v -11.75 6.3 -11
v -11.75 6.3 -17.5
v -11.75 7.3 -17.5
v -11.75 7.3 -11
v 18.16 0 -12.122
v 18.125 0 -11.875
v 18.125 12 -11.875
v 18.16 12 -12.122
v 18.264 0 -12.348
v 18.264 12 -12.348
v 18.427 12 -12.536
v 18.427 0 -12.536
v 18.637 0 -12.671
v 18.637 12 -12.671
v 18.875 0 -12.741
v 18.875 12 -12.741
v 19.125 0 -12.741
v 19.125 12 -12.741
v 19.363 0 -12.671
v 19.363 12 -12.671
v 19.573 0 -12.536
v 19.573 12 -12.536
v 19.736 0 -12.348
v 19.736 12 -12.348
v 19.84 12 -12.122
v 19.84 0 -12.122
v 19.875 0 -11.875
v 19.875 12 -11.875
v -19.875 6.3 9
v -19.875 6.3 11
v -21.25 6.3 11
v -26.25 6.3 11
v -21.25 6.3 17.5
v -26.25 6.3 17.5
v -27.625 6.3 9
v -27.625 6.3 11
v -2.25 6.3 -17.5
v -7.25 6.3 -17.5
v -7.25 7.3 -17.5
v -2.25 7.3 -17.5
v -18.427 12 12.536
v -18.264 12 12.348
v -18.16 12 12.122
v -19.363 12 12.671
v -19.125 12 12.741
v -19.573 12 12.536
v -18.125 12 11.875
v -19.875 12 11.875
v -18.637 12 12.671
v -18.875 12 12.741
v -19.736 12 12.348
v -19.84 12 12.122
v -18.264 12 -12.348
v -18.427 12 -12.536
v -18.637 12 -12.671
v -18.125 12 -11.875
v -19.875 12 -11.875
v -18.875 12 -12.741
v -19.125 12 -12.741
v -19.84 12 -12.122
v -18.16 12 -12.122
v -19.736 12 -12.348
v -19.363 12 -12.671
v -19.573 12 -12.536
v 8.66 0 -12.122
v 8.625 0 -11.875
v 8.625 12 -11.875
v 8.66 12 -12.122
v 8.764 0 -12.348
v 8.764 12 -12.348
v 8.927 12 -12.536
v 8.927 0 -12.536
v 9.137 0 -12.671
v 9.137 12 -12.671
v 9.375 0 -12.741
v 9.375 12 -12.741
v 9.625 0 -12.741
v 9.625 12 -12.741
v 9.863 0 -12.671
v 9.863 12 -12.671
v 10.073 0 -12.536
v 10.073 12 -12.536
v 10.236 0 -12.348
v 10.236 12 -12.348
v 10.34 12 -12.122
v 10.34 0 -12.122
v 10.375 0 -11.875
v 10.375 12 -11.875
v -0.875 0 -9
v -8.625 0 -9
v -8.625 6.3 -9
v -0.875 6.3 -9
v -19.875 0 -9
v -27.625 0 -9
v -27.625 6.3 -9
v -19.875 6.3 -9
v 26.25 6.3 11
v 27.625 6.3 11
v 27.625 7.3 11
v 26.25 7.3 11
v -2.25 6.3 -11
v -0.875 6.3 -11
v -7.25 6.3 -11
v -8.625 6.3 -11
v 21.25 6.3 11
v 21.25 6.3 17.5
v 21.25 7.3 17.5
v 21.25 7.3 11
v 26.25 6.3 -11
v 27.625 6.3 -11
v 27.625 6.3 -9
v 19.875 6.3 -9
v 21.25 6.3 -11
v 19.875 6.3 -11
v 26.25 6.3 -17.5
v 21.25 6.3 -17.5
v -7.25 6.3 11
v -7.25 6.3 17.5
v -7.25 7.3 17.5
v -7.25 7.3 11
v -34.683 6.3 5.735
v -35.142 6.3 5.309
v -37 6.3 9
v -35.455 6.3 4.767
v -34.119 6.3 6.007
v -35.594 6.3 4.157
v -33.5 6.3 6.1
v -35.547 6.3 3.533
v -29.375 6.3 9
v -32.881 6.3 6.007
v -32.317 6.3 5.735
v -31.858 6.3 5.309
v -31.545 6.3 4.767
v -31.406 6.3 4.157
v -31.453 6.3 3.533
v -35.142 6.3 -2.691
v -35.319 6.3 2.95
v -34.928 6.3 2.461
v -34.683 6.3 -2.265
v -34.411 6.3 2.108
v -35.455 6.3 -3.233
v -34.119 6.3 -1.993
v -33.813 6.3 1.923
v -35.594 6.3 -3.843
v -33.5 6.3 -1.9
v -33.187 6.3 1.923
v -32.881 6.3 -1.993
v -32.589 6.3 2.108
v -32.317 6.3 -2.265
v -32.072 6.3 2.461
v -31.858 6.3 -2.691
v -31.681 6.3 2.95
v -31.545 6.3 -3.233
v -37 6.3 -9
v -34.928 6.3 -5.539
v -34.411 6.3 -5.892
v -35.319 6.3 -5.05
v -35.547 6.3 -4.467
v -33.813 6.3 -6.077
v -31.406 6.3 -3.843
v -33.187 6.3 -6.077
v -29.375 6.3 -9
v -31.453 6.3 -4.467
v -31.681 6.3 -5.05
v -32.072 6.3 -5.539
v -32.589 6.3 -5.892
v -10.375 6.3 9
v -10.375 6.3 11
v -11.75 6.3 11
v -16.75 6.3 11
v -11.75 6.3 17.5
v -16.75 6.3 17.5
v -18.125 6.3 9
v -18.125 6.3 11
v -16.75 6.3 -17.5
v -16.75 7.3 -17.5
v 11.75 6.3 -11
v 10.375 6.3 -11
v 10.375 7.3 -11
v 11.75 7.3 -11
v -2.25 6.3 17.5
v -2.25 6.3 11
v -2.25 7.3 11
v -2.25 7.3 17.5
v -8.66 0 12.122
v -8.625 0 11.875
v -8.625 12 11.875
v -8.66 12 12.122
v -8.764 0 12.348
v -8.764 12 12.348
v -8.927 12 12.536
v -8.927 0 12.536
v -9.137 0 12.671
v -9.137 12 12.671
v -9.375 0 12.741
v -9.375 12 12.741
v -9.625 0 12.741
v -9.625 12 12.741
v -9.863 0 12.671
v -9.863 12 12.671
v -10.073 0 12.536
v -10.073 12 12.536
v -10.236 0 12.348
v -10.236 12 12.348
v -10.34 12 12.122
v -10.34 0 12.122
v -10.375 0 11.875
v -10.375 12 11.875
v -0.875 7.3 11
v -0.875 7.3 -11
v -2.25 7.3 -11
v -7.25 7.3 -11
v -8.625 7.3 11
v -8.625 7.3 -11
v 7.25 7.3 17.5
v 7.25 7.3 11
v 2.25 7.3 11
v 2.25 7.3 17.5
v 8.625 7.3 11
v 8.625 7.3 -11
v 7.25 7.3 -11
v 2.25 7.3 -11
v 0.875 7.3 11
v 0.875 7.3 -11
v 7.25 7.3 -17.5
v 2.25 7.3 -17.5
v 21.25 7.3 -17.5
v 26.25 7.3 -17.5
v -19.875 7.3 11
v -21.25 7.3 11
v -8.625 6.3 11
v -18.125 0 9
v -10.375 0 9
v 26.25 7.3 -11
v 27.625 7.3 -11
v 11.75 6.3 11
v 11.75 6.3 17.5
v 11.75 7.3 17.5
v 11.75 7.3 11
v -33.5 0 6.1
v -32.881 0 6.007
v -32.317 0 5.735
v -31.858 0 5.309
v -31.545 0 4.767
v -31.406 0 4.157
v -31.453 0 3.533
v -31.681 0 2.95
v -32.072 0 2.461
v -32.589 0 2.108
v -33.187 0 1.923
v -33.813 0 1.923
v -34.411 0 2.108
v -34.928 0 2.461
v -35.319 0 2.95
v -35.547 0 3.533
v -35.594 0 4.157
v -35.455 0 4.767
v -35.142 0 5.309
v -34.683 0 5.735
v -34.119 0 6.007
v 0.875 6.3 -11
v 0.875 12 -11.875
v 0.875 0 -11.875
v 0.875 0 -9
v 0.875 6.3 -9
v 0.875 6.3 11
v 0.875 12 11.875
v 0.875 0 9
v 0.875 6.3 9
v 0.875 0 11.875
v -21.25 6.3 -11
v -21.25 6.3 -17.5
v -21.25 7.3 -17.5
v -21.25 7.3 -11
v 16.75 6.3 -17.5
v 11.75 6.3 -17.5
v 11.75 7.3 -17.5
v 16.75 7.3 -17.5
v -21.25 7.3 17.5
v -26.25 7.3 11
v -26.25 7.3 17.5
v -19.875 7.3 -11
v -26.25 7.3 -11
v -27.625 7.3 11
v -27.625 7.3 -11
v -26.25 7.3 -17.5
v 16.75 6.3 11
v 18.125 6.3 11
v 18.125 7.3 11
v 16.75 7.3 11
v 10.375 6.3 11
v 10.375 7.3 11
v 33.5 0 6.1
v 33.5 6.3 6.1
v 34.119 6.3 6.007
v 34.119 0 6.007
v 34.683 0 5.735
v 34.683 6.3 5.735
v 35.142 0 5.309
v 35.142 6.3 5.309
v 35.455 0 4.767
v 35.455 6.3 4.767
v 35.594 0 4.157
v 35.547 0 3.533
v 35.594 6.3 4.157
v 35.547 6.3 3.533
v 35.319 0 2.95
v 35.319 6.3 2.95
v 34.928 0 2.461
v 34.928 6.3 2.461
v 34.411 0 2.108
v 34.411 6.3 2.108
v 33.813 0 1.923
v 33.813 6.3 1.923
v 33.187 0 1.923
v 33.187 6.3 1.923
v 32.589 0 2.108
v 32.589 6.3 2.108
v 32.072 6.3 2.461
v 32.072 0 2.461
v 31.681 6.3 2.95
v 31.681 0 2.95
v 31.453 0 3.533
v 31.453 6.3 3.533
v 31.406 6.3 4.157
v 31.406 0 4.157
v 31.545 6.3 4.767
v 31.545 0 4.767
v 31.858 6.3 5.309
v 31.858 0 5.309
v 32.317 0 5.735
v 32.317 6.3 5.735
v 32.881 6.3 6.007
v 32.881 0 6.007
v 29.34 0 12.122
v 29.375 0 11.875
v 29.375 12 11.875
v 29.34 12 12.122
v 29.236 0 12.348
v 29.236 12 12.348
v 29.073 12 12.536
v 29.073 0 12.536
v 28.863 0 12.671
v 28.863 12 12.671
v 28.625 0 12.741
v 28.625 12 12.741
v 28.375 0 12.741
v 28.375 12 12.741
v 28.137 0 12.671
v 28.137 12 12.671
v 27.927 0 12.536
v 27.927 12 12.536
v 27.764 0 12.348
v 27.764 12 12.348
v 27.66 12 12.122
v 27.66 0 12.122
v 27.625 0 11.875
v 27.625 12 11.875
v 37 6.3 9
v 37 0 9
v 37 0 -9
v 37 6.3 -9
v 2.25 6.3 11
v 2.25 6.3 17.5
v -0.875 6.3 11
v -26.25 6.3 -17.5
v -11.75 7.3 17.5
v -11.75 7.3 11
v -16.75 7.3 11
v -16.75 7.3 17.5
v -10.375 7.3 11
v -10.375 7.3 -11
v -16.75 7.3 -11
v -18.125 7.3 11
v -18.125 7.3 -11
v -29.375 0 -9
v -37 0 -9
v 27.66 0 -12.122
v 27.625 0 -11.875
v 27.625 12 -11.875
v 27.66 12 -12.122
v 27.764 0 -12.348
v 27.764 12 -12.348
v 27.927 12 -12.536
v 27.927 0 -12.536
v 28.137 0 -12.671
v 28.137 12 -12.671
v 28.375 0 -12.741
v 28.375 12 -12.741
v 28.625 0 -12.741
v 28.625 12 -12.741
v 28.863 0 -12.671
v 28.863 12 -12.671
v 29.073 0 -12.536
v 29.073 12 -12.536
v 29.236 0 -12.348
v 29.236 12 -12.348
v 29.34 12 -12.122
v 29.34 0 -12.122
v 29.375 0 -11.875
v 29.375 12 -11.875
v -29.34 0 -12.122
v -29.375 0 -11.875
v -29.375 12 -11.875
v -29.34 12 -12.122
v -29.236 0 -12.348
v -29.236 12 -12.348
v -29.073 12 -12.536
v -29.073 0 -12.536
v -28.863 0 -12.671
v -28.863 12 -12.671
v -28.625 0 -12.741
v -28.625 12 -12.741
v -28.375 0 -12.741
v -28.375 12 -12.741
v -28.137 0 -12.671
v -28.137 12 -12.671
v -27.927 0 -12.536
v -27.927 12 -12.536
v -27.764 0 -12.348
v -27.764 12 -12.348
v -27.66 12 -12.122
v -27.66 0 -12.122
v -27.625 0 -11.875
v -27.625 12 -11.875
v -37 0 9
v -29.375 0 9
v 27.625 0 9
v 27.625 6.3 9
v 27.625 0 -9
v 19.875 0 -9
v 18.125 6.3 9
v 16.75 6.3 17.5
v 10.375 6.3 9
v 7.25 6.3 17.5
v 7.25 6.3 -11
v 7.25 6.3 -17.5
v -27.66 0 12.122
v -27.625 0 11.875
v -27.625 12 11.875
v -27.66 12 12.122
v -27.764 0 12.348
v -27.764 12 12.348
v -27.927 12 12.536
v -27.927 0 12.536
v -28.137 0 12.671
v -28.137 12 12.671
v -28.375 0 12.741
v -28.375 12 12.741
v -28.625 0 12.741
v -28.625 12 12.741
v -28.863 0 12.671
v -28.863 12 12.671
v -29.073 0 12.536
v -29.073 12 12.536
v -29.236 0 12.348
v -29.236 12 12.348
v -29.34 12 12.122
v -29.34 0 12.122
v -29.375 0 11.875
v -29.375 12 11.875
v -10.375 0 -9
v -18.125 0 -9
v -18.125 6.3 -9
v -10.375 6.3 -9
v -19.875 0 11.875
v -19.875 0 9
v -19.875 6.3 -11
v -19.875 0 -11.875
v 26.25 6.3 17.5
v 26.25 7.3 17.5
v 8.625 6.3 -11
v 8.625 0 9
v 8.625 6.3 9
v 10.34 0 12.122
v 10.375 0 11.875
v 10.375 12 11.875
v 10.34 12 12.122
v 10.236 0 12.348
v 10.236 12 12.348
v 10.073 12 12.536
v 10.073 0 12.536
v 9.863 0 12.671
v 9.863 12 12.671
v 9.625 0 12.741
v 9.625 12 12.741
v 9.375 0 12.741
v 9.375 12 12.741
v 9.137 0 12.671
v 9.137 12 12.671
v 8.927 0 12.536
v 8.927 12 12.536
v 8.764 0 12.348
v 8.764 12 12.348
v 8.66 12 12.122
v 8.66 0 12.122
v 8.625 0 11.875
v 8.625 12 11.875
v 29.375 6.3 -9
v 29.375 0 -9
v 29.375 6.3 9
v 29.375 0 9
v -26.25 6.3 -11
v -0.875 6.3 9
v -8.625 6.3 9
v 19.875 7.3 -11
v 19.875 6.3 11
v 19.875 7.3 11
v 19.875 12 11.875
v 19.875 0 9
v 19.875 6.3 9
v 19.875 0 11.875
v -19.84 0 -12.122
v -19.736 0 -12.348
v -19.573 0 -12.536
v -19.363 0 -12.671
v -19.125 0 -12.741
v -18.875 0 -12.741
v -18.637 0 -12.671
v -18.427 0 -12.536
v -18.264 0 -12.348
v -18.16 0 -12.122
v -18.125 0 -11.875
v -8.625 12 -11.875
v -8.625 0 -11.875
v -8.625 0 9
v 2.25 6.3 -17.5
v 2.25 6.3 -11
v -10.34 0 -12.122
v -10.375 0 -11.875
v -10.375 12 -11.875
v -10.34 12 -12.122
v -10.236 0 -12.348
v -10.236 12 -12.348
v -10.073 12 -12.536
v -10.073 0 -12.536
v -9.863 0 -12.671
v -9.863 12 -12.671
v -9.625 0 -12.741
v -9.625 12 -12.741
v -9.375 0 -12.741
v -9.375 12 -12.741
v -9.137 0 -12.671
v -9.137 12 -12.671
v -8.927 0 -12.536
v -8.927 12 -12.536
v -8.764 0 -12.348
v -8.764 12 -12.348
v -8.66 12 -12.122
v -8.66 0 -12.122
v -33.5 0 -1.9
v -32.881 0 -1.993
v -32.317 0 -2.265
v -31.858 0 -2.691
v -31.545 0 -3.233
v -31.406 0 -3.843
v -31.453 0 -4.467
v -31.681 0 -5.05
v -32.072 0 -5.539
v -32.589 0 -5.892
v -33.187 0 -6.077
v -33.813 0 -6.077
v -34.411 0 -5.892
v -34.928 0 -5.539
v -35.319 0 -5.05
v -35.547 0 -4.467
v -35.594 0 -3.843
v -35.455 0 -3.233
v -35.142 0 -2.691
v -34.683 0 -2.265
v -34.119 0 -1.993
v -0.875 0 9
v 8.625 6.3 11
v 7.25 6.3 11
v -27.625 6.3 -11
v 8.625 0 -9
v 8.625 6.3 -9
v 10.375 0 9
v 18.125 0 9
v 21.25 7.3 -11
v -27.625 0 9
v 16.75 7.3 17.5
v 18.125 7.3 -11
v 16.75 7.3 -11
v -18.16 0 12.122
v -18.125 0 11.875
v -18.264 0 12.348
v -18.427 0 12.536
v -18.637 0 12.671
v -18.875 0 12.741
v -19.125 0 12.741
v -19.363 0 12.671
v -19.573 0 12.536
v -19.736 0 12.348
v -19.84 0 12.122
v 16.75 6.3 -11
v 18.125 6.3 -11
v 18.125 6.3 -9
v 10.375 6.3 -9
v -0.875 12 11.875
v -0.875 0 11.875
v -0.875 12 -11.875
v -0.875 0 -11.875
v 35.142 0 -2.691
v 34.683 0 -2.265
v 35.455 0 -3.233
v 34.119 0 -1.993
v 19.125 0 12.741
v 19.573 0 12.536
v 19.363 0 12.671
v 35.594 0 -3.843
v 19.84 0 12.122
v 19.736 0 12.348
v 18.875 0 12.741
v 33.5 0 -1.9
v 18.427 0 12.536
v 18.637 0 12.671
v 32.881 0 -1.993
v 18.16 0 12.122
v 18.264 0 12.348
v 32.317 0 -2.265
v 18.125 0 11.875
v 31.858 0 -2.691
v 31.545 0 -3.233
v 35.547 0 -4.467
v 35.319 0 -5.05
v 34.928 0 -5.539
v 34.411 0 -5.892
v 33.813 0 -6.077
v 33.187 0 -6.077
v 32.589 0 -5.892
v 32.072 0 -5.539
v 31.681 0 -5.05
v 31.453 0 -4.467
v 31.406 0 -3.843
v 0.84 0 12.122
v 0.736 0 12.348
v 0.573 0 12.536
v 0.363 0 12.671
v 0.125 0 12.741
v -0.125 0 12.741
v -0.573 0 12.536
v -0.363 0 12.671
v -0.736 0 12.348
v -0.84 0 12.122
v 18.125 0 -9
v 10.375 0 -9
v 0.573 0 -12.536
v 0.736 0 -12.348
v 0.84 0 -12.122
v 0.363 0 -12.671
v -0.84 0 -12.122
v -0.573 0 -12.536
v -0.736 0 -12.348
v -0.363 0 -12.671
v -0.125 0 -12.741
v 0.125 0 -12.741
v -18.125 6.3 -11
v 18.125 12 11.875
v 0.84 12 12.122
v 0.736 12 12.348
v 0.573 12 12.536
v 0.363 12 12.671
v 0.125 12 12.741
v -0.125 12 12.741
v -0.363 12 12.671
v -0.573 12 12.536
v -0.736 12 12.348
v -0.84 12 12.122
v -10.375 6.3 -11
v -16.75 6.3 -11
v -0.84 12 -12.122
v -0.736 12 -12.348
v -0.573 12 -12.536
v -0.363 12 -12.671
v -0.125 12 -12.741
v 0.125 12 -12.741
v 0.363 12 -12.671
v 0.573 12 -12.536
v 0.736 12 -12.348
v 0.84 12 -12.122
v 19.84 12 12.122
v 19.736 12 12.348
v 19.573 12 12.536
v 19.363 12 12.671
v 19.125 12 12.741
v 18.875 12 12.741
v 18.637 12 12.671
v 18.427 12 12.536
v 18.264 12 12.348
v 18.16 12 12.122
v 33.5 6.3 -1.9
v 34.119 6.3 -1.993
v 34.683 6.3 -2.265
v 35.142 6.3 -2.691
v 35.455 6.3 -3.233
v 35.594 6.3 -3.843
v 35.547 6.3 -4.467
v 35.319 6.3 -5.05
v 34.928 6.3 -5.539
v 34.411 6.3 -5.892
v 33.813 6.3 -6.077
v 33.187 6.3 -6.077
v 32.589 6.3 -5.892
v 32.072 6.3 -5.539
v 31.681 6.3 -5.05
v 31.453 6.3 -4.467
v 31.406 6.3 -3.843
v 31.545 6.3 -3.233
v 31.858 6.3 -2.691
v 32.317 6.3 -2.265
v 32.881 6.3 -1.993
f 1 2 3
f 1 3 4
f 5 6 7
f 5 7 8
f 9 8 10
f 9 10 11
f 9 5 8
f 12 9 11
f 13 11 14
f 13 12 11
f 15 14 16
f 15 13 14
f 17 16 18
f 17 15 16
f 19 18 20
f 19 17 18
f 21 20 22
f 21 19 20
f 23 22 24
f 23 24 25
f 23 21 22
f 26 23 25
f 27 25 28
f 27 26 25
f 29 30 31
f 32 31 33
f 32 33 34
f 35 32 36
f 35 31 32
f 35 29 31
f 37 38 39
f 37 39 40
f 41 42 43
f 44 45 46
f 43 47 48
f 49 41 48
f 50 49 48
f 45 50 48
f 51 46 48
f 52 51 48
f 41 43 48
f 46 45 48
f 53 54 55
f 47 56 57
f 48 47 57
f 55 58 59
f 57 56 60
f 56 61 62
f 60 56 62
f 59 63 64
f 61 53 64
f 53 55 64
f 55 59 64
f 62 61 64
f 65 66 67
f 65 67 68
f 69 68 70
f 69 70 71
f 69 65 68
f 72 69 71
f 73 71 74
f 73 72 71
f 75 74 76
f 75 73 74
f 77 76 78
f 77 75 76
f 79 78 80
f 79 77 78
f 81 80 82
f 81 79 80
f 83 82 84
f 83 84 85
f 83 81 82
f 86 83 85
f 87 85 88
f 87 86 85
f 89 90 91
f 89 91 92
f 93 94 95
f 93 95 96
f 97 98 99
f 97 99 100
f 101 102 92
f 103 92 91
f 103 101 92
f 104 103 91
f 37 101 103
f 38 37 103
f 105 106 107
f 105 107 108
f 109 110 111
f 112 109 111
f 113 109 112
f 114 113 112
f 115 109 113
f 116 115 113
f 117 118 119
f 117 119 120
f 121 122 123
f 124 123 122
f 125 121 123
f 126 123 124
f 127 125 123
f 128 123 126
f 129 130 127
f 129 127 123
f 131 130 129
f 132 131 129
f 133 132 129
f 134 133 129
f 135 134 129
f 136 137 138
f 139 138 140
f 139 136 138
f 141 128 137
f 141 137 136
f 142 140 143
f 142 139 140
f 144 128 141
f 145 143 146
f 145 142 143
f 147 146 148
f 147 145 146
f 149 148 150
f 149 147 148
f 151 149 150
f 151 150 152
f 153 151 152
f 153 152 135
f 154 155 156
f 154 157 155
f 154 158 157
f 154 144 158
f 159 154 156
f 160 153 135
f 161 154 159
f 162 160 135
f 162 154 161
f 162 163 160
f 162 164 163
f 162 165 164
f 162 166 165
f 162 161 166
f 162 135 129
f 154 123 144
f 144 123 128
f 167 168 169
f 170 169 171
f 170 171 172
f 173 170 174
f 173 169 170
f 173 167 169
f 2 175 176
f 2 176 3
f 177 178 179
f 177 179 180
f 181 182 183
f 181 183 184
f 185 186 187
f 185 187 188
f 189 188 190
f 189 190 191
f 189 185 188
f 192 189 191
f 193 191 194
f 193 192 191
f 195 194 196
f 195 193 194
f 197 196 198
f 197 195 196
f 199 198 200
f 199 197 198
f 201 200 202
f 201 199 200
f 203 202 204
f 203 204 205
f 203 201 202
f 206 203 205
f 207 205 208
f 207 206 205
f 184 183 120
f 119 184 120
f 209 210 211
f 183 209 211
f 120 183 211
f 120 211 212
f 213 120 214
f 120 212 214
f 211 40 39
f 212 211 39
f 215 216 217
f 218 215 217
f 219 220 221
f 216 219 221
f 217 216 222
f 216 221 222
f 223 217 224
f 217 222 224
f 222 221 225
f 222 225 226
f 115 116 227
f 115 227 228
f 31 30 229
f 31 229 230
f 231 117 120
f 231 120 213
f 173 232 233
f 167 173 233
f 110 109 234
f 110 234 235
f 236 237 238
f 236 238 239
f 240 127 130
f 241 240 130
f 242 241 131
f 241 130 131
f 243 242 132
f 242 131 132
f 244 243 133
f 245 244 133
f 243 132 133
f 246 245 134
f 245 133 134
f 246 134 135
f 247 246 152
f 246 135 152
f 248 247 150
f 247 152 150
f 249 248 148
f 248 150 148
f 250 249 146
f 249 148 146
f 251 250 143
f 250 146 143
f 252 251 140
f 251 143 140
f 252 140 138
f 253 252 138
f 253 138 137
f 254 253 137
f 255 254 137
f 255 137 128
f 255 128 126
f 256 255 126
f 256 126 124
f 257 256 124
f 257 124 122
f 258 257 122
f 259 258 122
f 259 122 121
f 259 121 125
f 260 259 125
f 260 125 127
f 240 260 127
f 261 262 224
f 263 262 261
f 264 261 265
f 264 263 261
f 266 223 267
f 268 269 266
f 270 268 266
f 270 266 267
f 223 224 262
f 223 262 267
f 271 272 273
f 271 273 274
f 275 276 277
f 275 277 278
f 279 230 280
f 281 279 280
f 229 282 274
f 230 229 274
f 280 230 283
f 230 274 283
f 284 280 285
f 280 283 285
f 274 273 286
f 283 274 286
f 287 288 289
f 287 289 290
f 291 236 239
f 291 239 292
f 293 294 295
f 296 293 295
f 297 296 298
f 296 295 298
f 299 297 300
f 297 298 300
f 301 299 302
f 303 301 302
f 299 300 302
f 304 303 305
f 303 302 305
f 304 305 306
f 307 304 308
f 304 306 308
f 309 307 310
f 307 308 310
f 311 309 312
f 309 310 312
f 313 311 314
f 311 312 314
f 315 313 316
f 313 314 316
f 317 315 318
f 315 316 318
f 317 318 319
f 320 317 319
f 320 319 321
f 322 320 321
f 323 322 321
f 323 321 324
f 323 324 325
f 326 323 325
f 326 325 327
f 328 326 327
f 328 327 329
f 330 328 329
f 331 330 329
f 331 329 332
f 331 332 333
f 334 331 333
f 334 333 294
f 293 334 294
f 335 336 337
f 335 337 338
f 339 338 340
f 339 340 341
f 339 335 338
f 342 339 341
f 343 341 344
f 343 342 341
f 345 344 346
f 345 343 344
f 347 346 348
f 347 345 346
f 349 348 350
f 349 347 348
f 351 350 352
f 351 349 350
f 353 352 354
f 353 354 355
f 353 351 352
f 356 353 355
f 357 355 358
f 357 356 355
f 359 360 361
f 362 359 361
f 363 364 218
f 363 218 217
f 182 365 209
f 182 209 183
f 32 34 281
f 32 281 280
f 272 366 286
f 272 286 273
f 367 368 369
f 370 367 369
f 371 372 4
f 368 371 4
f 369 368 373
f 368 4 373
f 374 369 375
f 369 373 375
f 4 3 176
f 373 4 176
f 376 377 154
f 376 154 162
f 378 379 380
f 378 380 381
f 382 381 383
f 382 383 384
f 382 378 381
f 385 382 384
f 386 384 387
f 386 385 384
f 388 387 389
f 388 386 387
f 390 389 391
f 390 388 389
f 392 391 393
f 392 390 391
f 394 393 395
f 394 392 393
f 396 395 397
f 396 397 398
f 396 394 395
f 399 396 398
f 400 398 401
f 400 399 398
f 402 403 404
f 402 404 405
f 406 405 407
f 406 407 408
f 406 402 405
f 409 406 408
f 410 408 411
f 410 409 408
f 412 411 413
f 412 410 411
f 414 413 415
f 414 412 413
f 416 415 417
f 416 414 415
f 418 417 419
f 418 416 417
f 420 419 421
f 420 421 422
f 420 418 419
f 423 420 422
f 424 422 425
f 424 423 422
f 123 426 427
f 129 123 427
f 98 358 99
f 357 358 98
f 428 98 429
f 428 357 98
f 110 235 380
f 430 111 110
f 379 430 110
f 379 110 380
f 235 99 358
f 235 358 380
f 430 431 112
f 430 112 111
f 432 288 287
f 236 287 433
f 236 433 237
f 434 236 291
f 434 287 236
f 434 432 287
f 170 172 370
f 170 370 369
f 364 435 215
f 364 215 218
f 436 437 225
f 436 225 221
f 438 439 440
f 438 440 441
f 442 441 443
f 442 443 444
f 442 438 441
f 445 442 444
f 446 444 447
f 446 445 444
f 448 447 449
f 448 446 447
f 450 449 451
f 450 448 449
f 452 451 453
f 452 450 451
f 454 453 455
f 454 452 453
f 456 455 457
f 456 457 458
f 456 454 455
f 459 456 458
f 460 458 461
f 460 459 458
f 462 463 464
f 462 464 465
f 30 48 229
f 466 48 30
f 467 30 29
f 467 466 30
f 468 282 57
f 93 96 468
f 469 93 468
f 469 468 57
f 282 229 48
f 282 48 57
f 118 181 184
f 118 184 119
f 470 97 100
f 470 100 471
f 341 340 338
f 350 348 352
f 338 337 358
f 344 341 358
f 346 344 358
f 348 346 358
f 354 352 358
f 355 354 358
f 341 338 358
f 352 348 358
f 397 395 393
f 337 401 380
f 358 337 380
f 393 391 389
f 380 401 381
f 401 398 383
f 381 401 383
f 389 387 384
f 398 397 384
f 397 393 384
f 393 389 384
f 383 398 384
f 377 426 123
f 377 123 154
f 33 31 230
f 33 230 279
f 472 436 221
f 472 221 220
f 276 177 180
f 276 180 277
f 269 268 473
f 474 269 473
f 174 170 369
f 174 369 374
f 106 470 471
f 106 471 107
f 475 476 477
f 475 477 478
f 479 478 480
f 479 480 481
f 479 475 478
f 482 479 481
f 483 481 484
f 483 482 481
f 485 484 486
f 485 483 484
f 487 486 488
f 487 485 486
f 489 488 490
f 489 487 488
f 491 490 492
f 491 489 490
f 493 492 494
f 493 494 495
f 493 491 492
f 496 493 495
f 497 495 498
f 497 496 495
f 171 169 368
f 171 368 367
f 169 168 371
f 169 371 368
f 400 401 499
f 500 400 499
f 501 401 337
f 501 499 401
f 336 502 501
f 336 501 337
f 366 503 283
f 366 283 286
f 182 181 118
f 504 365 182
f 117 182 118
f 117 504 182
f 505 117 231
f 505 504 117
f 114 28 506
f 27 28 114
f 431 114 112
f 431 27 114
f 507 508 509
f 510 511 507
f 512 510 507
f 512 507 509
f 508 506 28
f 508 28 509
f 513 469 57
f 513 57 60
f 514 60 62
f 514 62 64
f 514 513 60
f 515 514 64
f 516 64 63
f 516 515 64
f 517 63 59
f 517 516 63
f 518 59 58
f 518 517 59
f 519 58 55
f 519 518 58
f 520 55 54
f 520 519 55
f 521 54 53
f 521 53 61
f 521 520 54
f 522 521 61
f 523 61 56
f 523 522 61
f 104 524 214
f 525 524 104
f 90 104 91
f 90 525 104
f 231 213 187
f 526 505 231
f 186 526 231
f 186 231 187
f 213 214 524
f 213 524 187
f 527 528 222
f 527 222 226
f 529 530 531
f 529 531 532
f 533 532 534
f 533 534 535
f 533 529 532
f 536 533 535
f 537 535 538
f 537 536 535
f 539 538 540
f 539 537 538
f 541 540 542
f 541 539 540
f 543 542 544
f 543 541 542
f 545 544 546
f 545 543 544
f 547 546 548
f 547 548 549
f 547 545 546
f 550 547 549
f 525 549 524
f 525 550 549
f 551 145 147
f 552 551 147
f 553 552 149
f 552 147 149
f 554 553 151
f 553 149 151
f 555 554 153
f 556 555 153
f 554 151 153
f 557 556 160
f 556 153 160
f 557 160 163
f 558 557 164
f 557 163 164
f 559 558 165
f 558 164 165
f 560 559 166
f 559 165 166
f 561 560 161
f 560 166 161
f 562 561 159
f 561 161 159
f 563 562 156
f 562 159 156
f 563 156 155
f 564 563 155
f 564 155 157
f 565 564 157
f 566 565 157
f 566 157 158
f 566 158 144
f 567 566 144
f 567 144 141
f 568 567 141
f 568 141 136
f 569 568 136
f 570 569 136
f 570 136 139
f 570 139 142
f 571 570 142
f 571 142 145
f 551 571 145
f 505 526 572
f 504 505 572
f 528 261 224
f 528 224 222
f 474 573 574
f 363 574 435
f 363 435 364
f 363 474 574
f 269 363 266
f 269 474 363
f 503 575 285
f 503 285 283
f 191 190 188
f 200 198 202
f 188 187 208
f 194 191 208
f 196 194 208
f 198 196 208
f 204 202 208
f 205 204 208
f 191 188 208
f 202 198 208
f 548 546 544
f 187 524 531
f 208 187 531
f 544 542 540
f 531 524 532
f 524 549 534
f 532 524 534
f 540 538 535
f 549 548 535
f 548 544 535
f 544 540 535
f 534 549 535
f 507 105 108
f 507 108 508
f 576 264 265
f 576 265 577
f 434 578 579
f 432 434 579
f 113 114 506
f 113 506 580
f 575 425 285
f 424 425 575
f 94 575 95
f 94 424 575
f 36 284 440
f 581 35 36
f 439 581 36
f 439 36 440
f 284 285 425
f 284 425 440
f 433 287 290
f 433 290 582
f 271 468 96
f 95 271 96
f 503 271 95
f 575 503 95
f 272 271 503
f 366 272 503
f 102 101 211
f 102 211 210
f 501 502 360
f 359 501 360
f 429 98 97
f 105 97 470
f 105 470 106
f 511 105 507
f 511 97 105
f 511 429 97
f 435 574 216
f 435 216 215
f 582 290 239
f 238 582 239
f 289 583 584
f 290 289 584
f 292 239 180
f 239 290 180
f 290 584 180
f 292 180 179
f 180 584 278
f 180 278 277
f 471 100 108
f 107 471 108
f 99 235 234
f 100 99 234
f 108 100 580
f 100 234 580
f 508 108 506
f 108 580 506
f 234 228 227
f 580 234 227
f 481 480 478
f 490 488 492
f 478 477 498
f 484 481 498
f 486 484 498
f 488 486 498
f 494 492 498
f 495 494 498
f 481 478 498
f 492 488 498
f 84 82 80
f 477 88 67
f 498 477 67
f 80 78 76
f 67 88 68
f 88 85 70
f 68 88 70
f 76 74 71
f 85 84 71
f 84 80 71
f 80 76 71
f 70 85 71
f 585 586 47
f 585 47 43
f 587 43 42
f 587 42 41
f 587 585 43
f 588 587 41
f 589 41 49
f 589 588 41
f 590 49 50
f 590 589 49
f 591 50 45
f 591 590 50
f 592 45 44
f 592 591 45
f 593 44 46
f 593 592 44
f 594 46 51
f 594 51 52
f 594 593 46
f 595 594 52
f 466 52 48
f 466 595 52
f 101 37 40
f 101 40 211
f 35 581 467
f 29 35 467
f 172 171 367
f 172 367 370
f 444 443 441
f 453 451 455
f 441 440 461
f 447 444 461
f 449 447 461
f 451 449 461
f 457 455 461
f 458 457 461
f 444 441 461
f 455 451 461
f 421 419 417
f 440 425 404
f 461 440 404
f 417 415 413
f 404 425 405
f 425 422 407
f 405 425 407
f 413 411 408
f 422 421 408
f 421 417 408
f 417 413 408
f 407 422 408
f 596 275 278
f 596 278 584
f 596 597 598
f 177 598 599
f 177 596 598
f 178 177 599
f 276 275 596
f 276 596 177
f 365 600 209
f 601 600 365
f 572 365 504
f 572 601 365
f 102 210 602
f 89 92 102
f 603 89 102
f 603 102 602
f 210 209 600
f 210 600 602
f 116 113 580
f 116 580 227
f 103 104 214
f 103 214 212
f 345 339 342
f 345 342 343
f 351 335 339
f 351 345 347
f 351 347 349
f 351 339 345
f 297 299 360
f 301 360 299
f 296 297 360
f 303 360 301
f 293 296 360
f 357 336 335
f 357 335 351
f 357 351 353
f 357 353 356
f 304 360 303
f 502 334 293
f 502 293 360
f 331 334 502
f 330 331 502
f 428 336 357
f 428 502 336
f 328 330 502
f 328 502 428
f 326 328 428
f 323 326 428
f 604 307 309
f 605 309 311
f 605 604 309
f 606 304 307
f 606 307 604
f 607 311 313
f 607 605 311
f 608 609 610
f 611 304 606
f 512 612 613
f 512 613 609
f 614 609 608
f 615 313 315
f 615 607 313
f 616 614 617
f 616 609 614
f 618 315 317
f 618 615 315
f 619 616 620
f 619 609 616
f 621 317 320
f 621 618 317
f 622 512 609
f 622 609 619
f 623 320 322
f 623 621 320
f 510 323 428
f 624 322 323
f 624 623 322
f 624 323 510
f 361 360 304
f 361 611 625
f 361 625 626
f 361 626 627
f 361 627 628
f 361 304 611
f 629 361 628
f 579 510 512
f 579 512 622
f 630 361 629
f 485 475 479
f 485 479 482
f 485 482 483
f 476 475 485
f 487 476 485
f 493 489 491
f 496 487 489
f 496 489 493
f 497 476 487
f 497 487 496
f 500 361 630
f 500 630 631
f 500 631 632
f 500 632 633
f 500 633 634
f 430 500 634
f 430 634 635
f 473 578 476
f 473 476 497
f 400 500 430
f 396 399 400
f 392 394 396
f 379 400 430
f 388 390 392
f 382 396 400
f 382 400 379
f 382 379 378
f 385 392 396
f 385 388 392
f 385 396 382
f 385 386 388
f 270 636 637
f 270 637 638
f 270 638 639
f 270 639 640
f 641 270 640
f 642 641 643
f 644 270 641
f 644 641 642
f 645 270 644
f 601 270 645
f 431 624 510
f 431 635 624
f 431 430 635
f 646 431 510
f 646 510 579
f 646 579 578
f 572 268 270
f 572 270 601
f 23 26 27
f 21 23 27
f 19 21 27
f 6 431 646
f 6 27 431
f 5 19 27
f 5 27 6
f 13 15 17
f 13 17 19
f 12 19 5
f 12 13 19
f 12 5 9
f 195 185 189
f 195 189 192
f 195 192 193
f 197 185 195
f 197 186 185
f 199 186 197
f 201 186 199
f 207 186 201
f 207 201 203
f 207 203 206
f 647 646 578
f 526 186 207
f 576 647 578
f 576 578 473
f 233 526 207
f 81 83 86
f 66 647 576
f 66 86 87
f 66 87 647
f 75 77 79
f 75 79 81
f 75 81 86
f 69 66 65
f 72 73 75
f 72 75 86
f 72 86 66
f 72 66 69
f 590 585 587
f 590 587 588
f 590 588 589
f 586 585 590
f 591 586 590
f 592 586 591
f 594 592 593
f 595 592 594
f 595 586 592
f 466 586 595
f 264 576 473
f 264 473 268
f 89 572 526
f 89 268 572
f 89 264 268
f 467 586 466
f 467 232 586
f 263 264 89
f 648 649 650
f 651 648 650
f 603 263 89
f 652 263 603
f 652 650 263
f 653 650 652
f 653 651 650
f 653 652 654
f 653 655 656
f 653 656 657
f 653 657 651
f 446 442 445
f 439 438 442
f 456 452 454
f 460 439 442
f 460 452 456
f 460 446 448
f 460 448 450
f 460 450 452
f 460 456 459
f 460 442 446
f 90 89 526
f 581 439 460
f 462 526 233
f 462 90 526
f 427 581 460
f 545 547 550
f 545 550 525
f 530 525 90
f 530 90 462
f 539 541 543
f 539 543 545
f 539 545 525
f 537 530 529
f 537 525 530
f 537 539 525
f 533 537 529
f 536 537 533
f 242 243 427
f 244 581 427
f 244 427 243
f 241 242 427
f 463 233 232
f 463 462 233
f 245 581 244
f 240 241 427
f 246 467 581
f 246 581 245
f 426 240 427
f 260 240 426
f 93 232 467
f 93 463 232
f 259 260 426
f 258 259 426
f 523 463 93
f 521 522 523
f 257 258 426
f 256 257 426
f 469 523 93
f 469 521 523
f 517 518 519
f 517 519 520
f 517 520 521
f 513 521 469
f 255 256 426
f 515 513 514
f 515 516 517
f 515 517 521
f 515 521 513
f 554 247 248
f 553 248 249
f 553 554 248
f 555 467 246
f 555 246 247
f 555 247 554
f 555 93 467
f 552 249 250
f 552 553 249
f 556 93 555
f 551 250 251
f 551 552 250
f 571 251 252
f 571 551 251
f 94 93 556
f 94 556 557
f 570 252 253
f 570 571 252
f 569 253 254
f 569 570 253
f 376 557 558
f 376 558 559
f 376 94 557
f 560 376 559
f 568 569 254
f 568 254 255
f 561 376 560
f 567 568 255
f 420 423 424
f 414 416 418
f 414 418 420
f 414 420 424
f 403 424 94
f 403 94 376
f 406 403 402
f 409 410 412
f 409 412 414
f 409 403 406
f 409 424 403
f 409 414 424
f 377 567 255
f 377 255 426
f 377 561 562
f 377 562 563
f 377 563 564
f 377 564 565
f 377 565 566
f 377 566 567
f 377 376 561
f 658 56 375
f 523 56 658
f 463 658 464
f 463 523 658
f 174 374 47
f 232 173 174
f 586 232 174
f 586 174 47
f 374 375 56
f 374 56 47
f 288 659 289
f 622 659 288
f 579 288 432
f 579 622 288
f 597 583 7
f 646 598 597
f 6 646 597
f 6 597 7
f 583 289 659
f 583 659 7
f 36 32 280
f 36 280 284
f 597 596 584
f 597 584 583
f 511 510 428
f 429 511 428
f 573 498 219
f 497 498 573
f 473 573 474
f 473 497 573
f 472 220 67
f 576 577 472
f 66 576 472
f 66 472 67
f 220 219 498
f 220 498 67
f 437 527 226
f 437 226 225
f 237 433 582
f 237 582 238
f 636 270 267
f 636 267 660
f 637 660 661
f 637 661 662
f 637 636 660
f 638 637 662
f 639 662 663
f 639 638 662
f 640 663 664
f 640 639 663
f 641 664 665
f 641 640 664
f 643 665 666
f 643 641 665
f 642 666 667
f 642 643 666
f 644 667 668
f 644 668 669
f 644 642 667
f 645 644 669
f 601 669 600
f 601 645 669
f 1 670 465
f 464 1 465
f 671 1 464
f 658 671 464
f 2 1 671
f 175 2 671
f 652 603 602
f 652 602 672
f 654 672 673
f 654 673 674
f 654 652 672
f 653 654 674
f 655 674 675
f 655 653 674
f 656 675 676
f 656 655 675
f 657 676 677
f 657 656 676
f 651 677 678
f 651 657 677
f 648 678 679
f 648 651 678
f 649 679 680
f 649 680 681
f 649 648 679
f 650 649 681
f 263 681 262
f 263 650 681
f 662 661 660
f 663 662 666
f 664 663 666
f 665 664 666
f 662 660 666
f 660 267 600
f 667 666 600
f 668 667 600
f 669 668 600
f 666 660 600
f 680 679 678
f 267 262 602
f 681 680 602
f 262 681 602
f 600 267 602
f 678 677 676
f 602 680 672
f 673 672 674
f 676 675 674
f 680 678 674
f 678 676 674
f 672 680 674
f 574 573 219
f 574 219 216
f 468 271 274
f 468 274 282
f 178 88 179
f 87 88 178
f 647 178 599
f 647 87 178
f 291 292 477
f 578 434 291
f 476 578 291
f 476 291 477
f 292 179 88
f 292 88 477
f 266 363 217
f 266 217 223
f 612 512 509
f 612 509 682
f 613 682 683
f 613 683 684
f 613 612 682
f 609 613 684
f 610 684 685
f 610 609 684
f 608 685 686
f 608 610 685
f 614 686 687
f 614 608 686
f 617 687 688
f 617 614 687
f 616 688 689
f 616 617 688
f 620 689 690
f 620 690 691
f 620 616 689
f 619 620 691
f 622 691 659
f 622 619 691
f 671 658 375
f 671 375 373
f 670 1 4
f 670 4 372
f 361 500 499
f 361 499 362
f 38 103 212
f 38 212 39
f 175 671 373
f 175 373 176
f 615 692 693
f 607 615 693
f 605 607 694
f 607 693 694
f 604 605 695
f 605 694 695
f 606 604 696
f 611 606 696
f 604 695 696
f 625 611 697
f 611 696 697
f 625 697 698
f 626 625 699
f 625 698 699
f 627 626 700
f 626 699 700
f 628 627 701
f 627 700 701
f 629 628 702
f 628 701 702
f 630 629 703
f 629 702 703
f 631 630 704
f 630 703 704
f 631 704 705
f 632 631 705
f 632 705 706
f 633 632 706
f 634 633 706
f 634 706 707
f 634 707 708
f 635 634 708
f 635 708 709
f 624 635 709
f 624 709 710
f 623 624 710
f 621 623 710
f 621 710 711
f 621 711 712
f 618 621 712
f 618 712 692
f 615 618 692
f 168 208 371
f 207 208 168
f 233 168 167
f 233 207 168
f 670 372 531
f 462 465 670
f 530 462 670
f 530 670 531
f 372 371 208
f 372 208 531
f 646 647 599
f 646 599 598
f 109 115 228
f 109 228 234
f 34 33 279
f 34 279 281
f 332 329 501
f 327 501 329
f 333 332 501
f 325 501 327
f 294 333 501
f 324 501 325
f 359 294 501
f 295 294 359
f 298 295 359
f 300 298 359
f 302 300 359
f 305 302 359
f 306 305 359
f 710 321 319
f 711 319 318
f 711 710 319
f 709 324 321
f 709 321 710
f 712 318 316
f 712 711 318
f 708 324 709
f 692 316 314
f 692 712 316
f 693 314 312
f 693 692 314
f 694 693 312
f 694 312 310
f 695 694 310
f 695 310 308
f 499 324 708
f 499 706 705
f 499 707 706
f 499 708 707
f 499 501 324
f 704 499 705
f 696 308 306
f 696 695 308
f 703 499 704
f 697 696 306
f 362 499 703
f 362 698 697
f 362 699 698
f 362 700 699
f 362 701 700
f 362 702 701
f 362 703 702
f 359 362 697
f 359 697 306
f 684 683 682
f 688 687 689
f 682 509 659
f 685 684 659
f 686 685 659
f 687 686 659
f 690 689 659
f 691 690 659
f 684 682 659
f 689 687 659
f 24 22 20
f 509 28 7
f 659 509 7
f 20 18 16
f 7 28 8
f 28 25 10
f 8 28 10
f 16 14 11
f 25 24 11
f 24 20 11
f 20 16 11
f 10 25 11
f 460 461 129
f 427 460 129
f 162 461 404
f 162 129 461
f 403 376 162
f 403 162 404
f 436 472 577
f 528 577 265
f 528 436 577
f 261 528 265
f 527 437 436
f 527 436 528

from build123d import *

# Parameters (mm, degrees)
SKETCH1_W           = 74
SKETCH1_H           = 18
BOSS_EXTRUDE1_DEPTH = 6.3
BOSS_EXTRUDE2_DEPTH = 12
BOSS_EXTRUDE3_DEPTH = 1
SKETCH6_R           = 2.1
CUT_EXTRUDE1_DEPTH  = 42.411834057


with BuildPart() as part:
    # Sketch1 → Boss-Extrude1 (new body)
    with BuildSketch(Plane(origin=(0, 0, 0), x_dir=(1, 0, 0), z_dir=(0, 1, 0))):
        Rectangle(SKETCH1_W, SKETCH1_H)
    extrude(amount=BOSS_EXTRUDE1_DEPTH)

    # Sketch4 → Boss-Extrude2 (add)
    with BuildSketch(Plane(origin=(0, 0, 0), x_dir=(1, 0, 0), z_dir=(0, 1, 0))):
        with BuildLine():
            Line((-27.625, 11.875), (-27.625, -11.875))
            ThreePointArc((-27.625, -11.875), (-28.5, -12.75), (-29.375, -11.875))
            Line((-29.375, -11.875), (-29.375, 11.875))
            ThreePointArc((-29.375, 11.875), (-28.5, 12.75), (-27.625, 11.875))
        make_face()
        with BuildLine():
            Line((-18.125, 11.875), (-18.125, -11.875))
            ThreePointArc((-18.125, -11.875), (-19, -12.75), (-19.875, -11.875))
            Line((-19.875, -11.875), (-19.875, 11.875))
            ThreePointArc((-19.875, 11.875), (-19, 12.75), (-18.125, 11.875))
        make_face()
        with BuildLine():
            Line((-8.625, 11.875), (-8.625, -11.875))
            ThreePointArc((-8.625, -11.875), (-9.5, -12.75), (-10.375, -11.875))
            Line((-10.375, -11.875), (-10.375, 11.875))
            ThreePointArc((-10.375, 11.875), (-9.5, 12.75), (-8.625, 11.875))
        make_face()
        with BuildLine():
            Line((0.875, 11.875), (0.875, -11.875))
            ThreePointArc((0.875, -11.875), (0, -12.75), (-0.875, -11.875))
            Line((-0.875, -11.875), (-0.875, 11.875))
            ThreePointArc((-0.875, 11.875), (0, 12.75), (0.875, 11.875))
        make_face()
        with BuildLine():
            Line((10.375, 11.875), (10.375, -11.875))
            ThreePointArc((10.375, -11.875), (9.5, -12.75), (8.625, -11.875))
            Line((8.625, -11.875), (8.625, 11.875))
            ThreePointArc((8.625, 11.875), (9.5, 12.75), (10.375, 11.875))
        make_face()
        with BuildLine():
            Line((19.875, 11.875), (19.875, -11.875))
            ThreePointArc((19.875, -11.875), (19, -12.75), (18.125, -11.875))
            Line((18.125, -11.875), (18.125, 11.875))
            ThreePointArc((18.125, 11.875), (19, 12.75), (19.875, 11.875))
        make_face()
        with BuildLine():
            Line((29.375, 11.875), (29.375, -11.875))
            ThreePointArc((29.375, -11.875), (28.5, -12.75), (27.625, -11.875))
            Line((27.625, -11.875), (27.625, 11.875))
            ThreePointArc((27.625, 11.875), (28.5, 12.75), (29.375, 11.875))
        make_face()
    extrude(amount=BOSS_EXTRUDE2_DEPTH)

    # Sketch5 → Boss-Extrude3 (add)
    with BuildSketch(Plane(origin=(0, 6.3, 0), x_dir=(1, 0, 0), z_dir=(0, 1, 0))):
        Polygon((-27.625, 11), (-26.25, 11), (-26.25, 17.5), (-21.25, 17.5), (-21.25, 11), (-19.875, 11), (-19.875, -11), (-21.25, -11), (-21.25, -17.5), (-26.25, -17.5), (-26.25, -11), (-27.625, -11), align=None)
        Polygon((-18.125, 11), (-16.75, 11), (-16.75, 17.5), (-11.75, 17.5), (-11.75, 11), (-10.375, 11), (-10.375, -11), (-11.75, -11), (-11.75, -17.5), (-16.75, -17.5), (-16.75, -11), (-18.125, -11), align=None)
        Polygon((-8.625, 11), (-7.25, 11), (-7.25, 17.5), (-2.25, 17.5), (-2.25, 11), (-0.875, 11), (-0.875, -11), (-2.25, -11), (-2.25, -17.5), (-7.25, -17.5), (-7.25, -11), (-8.625, -11), align=None)
        Polygon((0.875, 11), (2.25, 11), (2.25, 17.5), (7.25, 17.5), (7.25, 11), (8.625, 11), (8.625, -11), (7.25, -11), (7.25, -17.5), (2.25, -17.5), (2.25, -11), (0.875, -11), align=None)
        Polygon((10.375, 11), (11.75, 11), (11.75, 17.5), (16.75, 17.5), (16.75, 11), (18.125, 11), (18.125, -11), (16.75, -11), (16.75, -17.5), (11.75, -17.5), (11.75, -11), (10.375, -11), align=None)
        Polygon((19.875, 11), (21.25, 11), (21.25, 17.5), (26.25, 17.5), (26.25, 11), (27.625, 11), (27.625, -11), (26.25, -11), (26.25, -17.5), (21.25, -17.5), (21.25, -11), (19.875, -11), align=None)
    extrude(amount=BOSS_EXTRUDE3_DEPTH)

    # Sketch6 → Cut-Extrude1 (cut, through all)
    with BuildSketch(Plane(origin=(0, 6.3, 0), x_dir=(1, 0, 0), z_dir=(0, 1, 0))):
        with Locations(Location((-33.5, 4, 0), (0, 0, 270))):
            Circle(SKETCH6_R)
        with Locations(Location((-33.5, -4, 0), (0, 0, 270))):
            Circle(SKETCH6_R)
        with Locations(Location((33.5, 4, 0), (0, 0, 270))):
            Circle(SKETCH6_R)
        with Locations(Location((33.5, -4, 0), (0, 0, 270))):
            Circle(SKETCH6_R)
    extrude(amount=-CUT_EXTRUDE1_DEPTH, mode=Mode.SUBTRACT)


solid = part.part
